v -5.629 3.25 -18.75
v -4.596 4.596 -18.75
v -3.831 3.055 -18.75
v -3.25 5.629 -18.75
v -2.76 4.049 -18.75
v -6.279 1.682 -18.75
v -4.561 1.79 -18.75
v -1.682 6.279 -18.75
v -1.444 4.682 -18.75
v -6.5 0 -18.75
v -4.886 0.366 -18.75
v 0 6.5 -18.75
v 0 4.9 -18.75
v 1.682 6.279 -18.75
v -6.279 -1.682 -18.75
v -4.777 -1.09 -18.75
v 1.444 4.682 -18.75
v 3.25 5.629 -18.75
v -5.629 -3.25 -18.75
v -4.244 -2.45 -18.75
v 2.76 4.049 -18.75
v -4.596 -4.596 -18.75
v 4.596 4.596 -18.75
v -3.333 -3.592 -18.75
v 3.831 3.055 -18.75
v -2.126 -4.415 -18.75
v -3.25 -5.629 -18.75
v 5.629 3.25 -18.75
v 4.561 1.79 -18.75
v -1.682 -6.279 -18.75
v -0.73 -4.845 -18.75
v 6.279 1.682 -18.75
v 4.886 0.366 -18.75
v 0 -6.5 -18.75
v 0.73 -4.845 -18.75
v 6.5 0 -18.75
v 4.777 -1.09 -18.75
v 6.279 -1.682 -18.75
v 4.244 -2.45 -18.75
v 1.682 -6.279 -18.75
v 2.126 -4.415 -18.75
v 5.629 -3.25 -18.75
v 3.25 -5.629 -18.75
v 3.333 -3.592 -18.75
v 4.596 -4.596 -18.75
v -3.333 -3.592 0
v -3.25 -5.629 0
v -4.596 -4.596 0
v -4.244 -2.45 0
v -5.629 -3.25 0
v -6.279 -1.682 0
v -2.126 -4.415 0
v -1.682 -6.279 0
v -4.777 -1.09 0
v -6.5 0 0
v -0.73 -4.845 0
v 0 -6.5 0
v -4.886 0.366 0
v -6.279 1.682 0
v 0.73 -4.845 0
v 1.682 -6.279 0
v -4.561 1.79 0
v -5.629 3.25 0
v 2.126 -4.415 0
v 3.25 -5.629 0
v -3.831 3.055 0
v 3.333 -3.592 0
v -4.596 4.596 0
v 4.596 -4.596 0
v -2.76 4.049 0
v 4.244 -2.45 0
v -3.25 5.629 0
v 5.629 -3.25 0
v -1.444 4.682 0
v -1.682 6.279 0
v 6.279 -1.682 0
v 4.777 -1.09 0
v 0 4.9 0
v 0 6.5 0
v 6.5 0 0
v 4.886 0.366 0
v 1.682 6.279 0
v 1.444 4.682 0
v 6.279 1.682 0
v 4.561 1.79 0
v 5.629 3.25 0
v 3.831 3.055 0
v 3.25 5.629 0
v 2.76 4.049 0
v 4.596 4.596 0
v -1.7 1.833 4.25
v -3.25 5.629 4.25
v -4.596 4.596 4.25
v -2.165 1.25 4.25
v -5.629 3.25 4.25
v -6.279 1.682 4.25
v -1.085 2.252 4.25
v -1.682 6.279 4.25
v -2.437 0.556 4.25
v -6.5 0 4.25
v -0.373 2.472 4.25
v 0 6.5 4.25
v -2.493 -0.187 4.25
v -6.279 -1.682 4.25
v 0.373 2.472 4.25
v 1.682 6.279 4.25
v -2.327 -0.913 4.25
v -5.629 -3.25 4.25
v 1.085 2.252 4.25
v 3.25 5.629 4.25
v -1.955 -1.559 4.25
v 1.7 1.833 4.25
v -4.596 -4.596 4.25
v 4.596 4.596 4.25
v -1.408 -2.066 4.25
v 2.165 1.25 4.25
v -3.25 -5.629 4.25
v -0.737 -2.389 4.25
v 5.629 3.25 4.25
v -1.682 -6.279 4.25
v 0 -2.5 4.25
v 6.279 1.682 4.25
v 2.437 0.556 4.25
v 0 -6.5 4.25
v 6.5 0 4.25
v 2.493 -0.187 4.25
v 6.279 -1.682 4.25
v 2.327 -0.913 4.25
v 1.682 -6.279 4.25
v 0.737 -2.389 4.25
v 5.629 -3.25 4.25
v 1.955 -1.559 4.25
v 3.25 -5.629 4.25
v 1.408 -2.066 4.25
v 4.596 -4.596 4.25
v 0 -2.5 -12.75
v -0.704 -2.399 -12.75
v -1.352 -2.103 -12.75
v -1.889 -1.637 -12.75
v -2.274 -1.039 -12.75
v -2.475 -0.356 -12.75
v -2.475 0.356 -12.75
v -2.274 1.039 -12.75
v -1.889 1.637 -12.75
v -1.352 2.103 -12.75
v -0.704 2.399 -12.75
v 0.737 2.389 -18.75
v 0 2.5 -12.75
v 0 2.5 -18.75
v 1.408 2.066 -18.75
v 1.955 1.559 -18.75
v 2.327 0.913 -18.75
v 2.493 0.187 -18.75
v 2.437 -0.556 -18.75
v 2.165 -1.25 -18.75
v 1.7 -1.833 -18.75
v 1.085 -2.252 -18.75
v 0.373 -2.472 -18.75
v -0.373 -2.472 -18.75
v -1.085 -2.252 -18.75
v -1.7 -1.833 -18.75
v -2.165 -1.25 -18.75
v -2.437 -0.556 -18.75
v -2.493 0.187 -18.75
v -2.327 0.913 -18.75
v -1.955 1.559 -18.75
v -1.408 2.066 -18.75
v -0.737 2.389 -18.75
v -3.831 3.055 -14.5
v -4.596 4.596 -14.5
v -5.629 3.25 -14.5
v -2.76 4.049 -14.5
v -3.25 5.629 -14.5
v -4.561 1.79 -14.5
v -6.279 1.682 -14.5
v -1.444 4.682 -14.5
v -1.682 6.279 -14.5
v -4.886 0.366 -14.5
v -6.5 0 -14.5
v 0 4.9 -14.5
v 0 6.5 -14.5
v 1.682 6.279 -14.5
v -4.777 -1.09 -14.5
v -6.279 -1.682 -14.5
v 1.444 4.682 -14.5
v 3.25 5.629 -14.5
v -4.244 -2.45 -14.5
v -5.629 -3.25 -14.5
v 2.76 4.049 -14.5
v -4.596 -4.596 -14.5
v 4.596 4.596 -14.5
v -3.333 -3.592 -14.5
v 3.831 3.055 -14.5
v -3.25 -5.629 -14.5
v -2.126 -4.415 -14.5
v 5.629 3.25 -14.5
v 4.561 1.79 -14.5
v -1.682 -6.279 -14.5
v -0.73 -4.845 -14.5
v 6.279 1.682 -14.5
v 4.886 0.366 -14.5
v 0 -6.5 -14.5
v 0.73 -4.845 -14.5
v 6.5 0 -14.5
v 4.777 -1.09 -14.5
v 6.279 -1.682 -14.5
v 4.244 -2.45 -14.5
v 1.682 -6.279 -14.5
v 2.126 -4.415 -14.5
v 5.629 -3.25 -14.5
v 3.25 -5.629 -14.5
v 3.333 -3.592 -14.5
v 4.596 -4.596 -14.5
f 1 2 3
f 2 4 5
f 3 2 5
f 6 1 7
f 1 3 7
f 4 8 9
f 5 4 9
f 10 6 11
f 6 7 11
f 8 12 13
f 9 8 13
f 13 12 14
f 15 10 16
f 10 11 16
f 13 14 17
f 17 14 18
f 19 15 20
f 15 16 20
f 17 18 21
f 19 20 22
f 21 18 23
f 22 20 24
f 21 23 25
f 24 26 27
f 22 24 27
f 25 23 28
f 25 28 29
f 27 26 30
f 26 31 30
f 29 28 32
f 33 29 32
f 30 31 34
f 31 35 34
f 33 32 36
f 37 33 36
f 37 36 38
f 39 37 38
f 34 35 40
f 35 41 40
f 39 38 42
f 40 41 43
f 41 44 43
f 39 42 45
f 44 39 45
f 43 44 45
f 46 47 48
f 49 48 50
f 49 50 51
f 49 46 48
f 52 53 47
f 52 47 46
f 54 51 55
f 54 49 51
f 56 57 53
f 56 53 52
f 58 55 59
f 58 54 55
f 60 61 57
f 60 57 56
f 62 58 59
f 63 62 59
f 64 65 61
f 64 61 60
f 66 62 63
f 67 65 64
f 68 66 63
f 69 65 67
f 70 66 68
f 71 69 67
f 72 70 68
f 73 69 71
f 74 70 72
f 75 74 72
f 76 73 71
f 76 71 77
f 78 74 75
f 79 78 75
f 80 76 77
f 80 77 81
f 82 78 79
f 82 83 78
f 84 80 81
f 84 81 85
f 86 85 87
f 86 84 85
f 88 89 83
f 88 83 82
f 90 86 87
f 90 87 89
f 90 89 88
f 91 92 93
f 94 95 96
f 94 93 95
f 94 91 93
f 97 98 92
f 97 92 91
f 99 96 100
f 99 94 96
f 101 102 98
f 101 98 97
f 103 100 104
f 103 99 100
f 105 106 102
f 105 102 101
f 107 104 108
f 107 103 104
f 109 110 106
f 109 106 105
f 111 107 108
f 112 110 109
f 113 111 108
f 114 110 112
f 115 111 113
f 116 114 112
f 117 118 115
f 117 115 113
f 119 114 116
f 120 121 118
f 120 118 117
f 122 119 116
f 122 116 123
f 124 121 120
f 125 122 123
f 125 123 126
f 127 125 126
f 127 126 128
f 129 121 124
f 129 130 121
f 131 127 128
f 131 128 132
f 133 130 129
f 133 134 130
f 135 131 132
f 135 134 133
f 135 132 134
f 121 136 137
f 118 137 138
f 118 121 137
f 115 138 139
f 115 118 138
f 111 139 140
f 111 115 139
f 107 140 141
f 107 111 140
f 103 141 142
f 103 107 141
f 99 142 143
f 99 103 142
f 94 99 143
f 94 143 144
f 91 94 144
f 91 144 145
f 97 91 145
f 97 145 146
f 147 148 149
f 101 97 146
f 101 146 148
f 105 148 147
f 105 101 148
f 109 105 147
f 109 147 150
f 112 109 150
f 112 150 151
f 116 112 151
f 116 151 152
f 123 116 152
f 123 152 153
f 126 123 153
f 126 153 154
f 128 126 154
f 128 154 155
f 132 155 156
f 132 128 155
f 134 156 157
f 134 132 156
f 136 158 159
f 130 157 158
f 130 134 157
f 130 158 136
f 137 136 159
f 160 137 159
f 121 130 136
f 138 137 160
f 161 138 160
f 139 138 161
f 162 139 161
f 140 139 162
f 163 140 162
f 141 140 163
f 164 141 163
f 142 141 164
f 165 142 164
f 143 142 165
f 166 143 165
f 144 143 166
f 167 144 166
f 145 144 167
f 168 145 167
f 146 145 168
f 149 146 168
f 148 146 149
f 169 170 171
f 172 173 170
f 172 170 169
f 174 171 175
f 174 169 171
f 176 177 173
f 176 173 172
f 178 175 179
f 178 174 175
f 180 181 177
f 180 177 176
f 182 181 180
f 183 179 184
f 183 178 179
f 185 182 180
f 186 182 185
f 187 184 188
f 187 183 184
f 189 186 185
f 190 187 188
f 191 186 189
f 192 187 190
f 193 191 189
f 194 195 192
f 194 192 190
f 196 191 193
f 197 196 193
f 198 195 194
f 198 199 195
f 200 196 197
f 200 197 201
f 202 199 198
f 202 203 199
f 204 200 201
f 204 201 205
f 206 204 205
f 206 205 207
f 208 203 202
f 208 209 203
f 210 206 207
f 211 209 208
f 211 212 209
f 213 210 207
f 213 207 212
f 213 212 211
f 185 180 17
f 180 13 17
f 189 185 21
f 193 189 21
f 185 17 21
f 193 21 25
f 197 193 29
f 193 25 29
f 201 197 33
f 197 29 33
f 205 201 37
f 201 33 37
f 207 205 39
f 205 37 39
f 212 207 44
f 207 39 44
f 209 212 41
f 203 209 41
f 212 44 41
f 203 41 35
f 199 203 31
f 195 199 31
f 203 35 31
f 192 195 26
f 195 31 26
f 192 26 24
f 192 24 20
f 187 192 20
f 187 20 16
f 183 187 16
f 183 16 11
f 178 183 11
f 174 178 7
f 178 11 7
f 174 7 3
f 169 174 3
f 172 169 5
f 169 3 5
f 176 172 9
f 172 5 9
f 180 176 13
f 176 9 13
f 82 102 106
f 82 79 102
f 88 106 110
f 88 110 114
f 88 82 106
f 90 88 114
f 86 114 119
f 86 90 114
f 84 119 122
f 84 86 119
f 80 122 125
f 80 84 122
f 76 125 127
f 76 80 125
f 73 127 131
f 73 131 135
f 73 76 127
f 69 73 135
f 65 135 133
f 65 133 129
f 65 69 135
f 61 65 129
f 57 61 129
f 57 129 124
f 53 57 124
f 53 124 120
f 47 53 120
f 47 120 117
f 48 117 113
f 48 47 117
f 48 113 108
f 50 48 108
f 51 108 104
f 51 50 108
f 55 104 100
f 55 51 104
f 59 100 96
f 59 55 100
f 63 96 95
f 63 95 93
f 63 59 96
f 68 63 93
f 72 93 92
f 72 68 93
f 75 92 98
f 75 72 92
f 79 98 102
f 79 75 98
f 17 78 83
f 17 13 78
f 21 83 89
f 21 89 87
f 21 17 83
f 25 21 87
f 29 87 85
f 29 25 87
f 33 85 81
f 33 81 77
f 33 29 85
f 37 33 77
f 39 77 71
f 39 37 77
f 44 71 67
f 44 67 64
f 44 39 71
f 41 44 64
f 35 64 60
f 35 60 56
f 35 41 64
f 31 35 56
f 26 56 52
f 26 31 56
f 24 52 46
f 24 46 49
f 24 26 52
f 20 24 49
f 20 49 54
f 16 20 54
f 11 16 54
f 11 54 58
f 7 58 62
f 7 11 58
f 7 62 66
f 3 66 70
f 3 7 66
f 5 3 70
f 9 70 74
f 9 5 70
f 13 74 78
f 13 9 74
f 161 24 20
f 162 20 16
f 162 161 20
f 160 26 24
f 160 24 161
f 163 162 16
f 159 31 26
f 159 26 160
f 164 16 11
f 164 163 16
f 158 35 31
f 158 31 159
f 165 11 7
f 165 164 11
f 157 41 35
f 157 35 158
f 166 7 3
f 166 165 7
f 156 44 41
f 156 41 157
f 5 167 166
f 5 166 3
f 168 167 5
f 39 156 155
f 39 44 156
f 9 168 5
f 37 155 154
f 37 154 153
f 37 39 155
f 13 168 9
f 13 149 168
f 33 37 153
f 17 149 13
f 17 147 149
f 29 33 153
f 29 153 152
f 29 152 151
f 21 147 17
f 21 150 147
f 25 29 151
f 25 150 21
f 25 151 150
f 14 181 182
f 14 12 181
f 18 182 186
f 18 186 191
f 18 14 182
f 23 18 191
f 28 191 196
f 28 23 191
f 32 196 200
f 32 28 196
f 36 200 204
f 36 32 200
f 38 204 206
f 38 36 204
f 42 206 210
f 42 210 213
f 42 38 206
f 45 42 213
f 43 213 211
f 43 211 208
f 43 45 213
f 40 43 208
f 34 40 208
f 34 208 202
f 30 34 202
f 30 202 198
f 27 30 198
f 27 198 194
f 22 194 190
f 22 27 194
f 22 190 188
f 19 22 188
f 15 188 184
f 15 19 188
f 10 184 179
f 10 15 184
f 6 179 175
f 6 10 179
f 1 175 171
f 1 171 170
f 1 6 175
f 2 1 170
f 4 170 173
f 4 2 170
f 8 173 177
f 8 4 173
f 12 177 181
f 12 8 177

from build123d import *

# Parameters (mm, degrees)
SKETCH_3_W = 4.25
SKETCH_3_H = 1.6


with BuildPart() as part:
    # Эскиз2 → Повернуть1 (revolve)
    with BuildSketch(Plane(origin=(0, 0, 0), x_dir=(0, 0, -1), z_dir=(1, 0, 0))):
        Polygon((18.75, 0), (-4.25, 0), (-4.25, 6.5), (0, 6.5), (0, 4.9), (18.75, 4.9), align=None)
    revolve(axis=Axis((0, 0, 1000), (0, 0, -1)))

    # Эскиз5 → Отверстие обработанное метчиком M61 (revolve, cut)
    with BuildSketch(Plane(origin=(0, 0, 4.25), x_dir=(0, -1, 0), z_dir=(1, 0, 0))):
        Polygon((0, 0), (0, 18.502151548), (2.5, 17), (2.5, 0), align=None)
    revolve(axis=Axis((0, 0, 10.6), (0, 0, -1)), mode=Mode.SUBTRACT)

    # Эскиз7 → Отверстие обработанное метчиком M62 (revolve, cut)
    with BuildSketch(Plane(origin=(0, 0, -18.75), x_dir=(0, 1, 0), z_dir=(1, 0, 0))):
        Polygon((0, 0), (0, 18.502151548), (2.5, 17), (2.5, 0), align=None)
    revolve(axis=Axis((0, 0, -25.1), (0, 0, 1)), mode=Mode.SUBTRACT)


with BuildPart() as body_2:
    # Эскиз3 → Повернуть2 (revolve)
    with BuildSketch(Plane(origin=(0, 0, 0), x_dir=(0, 0, -1), z_dir=(1, 0, 0))):
        with Locations((16.625, 5.7)):
            Rectangle(SKETCH_3_W, SKETCH_3_H)
    revolve(axis=Axis((0, 0, 1000), (0, 0, -1)))


solid = Compound([part.part, body_2.part])
